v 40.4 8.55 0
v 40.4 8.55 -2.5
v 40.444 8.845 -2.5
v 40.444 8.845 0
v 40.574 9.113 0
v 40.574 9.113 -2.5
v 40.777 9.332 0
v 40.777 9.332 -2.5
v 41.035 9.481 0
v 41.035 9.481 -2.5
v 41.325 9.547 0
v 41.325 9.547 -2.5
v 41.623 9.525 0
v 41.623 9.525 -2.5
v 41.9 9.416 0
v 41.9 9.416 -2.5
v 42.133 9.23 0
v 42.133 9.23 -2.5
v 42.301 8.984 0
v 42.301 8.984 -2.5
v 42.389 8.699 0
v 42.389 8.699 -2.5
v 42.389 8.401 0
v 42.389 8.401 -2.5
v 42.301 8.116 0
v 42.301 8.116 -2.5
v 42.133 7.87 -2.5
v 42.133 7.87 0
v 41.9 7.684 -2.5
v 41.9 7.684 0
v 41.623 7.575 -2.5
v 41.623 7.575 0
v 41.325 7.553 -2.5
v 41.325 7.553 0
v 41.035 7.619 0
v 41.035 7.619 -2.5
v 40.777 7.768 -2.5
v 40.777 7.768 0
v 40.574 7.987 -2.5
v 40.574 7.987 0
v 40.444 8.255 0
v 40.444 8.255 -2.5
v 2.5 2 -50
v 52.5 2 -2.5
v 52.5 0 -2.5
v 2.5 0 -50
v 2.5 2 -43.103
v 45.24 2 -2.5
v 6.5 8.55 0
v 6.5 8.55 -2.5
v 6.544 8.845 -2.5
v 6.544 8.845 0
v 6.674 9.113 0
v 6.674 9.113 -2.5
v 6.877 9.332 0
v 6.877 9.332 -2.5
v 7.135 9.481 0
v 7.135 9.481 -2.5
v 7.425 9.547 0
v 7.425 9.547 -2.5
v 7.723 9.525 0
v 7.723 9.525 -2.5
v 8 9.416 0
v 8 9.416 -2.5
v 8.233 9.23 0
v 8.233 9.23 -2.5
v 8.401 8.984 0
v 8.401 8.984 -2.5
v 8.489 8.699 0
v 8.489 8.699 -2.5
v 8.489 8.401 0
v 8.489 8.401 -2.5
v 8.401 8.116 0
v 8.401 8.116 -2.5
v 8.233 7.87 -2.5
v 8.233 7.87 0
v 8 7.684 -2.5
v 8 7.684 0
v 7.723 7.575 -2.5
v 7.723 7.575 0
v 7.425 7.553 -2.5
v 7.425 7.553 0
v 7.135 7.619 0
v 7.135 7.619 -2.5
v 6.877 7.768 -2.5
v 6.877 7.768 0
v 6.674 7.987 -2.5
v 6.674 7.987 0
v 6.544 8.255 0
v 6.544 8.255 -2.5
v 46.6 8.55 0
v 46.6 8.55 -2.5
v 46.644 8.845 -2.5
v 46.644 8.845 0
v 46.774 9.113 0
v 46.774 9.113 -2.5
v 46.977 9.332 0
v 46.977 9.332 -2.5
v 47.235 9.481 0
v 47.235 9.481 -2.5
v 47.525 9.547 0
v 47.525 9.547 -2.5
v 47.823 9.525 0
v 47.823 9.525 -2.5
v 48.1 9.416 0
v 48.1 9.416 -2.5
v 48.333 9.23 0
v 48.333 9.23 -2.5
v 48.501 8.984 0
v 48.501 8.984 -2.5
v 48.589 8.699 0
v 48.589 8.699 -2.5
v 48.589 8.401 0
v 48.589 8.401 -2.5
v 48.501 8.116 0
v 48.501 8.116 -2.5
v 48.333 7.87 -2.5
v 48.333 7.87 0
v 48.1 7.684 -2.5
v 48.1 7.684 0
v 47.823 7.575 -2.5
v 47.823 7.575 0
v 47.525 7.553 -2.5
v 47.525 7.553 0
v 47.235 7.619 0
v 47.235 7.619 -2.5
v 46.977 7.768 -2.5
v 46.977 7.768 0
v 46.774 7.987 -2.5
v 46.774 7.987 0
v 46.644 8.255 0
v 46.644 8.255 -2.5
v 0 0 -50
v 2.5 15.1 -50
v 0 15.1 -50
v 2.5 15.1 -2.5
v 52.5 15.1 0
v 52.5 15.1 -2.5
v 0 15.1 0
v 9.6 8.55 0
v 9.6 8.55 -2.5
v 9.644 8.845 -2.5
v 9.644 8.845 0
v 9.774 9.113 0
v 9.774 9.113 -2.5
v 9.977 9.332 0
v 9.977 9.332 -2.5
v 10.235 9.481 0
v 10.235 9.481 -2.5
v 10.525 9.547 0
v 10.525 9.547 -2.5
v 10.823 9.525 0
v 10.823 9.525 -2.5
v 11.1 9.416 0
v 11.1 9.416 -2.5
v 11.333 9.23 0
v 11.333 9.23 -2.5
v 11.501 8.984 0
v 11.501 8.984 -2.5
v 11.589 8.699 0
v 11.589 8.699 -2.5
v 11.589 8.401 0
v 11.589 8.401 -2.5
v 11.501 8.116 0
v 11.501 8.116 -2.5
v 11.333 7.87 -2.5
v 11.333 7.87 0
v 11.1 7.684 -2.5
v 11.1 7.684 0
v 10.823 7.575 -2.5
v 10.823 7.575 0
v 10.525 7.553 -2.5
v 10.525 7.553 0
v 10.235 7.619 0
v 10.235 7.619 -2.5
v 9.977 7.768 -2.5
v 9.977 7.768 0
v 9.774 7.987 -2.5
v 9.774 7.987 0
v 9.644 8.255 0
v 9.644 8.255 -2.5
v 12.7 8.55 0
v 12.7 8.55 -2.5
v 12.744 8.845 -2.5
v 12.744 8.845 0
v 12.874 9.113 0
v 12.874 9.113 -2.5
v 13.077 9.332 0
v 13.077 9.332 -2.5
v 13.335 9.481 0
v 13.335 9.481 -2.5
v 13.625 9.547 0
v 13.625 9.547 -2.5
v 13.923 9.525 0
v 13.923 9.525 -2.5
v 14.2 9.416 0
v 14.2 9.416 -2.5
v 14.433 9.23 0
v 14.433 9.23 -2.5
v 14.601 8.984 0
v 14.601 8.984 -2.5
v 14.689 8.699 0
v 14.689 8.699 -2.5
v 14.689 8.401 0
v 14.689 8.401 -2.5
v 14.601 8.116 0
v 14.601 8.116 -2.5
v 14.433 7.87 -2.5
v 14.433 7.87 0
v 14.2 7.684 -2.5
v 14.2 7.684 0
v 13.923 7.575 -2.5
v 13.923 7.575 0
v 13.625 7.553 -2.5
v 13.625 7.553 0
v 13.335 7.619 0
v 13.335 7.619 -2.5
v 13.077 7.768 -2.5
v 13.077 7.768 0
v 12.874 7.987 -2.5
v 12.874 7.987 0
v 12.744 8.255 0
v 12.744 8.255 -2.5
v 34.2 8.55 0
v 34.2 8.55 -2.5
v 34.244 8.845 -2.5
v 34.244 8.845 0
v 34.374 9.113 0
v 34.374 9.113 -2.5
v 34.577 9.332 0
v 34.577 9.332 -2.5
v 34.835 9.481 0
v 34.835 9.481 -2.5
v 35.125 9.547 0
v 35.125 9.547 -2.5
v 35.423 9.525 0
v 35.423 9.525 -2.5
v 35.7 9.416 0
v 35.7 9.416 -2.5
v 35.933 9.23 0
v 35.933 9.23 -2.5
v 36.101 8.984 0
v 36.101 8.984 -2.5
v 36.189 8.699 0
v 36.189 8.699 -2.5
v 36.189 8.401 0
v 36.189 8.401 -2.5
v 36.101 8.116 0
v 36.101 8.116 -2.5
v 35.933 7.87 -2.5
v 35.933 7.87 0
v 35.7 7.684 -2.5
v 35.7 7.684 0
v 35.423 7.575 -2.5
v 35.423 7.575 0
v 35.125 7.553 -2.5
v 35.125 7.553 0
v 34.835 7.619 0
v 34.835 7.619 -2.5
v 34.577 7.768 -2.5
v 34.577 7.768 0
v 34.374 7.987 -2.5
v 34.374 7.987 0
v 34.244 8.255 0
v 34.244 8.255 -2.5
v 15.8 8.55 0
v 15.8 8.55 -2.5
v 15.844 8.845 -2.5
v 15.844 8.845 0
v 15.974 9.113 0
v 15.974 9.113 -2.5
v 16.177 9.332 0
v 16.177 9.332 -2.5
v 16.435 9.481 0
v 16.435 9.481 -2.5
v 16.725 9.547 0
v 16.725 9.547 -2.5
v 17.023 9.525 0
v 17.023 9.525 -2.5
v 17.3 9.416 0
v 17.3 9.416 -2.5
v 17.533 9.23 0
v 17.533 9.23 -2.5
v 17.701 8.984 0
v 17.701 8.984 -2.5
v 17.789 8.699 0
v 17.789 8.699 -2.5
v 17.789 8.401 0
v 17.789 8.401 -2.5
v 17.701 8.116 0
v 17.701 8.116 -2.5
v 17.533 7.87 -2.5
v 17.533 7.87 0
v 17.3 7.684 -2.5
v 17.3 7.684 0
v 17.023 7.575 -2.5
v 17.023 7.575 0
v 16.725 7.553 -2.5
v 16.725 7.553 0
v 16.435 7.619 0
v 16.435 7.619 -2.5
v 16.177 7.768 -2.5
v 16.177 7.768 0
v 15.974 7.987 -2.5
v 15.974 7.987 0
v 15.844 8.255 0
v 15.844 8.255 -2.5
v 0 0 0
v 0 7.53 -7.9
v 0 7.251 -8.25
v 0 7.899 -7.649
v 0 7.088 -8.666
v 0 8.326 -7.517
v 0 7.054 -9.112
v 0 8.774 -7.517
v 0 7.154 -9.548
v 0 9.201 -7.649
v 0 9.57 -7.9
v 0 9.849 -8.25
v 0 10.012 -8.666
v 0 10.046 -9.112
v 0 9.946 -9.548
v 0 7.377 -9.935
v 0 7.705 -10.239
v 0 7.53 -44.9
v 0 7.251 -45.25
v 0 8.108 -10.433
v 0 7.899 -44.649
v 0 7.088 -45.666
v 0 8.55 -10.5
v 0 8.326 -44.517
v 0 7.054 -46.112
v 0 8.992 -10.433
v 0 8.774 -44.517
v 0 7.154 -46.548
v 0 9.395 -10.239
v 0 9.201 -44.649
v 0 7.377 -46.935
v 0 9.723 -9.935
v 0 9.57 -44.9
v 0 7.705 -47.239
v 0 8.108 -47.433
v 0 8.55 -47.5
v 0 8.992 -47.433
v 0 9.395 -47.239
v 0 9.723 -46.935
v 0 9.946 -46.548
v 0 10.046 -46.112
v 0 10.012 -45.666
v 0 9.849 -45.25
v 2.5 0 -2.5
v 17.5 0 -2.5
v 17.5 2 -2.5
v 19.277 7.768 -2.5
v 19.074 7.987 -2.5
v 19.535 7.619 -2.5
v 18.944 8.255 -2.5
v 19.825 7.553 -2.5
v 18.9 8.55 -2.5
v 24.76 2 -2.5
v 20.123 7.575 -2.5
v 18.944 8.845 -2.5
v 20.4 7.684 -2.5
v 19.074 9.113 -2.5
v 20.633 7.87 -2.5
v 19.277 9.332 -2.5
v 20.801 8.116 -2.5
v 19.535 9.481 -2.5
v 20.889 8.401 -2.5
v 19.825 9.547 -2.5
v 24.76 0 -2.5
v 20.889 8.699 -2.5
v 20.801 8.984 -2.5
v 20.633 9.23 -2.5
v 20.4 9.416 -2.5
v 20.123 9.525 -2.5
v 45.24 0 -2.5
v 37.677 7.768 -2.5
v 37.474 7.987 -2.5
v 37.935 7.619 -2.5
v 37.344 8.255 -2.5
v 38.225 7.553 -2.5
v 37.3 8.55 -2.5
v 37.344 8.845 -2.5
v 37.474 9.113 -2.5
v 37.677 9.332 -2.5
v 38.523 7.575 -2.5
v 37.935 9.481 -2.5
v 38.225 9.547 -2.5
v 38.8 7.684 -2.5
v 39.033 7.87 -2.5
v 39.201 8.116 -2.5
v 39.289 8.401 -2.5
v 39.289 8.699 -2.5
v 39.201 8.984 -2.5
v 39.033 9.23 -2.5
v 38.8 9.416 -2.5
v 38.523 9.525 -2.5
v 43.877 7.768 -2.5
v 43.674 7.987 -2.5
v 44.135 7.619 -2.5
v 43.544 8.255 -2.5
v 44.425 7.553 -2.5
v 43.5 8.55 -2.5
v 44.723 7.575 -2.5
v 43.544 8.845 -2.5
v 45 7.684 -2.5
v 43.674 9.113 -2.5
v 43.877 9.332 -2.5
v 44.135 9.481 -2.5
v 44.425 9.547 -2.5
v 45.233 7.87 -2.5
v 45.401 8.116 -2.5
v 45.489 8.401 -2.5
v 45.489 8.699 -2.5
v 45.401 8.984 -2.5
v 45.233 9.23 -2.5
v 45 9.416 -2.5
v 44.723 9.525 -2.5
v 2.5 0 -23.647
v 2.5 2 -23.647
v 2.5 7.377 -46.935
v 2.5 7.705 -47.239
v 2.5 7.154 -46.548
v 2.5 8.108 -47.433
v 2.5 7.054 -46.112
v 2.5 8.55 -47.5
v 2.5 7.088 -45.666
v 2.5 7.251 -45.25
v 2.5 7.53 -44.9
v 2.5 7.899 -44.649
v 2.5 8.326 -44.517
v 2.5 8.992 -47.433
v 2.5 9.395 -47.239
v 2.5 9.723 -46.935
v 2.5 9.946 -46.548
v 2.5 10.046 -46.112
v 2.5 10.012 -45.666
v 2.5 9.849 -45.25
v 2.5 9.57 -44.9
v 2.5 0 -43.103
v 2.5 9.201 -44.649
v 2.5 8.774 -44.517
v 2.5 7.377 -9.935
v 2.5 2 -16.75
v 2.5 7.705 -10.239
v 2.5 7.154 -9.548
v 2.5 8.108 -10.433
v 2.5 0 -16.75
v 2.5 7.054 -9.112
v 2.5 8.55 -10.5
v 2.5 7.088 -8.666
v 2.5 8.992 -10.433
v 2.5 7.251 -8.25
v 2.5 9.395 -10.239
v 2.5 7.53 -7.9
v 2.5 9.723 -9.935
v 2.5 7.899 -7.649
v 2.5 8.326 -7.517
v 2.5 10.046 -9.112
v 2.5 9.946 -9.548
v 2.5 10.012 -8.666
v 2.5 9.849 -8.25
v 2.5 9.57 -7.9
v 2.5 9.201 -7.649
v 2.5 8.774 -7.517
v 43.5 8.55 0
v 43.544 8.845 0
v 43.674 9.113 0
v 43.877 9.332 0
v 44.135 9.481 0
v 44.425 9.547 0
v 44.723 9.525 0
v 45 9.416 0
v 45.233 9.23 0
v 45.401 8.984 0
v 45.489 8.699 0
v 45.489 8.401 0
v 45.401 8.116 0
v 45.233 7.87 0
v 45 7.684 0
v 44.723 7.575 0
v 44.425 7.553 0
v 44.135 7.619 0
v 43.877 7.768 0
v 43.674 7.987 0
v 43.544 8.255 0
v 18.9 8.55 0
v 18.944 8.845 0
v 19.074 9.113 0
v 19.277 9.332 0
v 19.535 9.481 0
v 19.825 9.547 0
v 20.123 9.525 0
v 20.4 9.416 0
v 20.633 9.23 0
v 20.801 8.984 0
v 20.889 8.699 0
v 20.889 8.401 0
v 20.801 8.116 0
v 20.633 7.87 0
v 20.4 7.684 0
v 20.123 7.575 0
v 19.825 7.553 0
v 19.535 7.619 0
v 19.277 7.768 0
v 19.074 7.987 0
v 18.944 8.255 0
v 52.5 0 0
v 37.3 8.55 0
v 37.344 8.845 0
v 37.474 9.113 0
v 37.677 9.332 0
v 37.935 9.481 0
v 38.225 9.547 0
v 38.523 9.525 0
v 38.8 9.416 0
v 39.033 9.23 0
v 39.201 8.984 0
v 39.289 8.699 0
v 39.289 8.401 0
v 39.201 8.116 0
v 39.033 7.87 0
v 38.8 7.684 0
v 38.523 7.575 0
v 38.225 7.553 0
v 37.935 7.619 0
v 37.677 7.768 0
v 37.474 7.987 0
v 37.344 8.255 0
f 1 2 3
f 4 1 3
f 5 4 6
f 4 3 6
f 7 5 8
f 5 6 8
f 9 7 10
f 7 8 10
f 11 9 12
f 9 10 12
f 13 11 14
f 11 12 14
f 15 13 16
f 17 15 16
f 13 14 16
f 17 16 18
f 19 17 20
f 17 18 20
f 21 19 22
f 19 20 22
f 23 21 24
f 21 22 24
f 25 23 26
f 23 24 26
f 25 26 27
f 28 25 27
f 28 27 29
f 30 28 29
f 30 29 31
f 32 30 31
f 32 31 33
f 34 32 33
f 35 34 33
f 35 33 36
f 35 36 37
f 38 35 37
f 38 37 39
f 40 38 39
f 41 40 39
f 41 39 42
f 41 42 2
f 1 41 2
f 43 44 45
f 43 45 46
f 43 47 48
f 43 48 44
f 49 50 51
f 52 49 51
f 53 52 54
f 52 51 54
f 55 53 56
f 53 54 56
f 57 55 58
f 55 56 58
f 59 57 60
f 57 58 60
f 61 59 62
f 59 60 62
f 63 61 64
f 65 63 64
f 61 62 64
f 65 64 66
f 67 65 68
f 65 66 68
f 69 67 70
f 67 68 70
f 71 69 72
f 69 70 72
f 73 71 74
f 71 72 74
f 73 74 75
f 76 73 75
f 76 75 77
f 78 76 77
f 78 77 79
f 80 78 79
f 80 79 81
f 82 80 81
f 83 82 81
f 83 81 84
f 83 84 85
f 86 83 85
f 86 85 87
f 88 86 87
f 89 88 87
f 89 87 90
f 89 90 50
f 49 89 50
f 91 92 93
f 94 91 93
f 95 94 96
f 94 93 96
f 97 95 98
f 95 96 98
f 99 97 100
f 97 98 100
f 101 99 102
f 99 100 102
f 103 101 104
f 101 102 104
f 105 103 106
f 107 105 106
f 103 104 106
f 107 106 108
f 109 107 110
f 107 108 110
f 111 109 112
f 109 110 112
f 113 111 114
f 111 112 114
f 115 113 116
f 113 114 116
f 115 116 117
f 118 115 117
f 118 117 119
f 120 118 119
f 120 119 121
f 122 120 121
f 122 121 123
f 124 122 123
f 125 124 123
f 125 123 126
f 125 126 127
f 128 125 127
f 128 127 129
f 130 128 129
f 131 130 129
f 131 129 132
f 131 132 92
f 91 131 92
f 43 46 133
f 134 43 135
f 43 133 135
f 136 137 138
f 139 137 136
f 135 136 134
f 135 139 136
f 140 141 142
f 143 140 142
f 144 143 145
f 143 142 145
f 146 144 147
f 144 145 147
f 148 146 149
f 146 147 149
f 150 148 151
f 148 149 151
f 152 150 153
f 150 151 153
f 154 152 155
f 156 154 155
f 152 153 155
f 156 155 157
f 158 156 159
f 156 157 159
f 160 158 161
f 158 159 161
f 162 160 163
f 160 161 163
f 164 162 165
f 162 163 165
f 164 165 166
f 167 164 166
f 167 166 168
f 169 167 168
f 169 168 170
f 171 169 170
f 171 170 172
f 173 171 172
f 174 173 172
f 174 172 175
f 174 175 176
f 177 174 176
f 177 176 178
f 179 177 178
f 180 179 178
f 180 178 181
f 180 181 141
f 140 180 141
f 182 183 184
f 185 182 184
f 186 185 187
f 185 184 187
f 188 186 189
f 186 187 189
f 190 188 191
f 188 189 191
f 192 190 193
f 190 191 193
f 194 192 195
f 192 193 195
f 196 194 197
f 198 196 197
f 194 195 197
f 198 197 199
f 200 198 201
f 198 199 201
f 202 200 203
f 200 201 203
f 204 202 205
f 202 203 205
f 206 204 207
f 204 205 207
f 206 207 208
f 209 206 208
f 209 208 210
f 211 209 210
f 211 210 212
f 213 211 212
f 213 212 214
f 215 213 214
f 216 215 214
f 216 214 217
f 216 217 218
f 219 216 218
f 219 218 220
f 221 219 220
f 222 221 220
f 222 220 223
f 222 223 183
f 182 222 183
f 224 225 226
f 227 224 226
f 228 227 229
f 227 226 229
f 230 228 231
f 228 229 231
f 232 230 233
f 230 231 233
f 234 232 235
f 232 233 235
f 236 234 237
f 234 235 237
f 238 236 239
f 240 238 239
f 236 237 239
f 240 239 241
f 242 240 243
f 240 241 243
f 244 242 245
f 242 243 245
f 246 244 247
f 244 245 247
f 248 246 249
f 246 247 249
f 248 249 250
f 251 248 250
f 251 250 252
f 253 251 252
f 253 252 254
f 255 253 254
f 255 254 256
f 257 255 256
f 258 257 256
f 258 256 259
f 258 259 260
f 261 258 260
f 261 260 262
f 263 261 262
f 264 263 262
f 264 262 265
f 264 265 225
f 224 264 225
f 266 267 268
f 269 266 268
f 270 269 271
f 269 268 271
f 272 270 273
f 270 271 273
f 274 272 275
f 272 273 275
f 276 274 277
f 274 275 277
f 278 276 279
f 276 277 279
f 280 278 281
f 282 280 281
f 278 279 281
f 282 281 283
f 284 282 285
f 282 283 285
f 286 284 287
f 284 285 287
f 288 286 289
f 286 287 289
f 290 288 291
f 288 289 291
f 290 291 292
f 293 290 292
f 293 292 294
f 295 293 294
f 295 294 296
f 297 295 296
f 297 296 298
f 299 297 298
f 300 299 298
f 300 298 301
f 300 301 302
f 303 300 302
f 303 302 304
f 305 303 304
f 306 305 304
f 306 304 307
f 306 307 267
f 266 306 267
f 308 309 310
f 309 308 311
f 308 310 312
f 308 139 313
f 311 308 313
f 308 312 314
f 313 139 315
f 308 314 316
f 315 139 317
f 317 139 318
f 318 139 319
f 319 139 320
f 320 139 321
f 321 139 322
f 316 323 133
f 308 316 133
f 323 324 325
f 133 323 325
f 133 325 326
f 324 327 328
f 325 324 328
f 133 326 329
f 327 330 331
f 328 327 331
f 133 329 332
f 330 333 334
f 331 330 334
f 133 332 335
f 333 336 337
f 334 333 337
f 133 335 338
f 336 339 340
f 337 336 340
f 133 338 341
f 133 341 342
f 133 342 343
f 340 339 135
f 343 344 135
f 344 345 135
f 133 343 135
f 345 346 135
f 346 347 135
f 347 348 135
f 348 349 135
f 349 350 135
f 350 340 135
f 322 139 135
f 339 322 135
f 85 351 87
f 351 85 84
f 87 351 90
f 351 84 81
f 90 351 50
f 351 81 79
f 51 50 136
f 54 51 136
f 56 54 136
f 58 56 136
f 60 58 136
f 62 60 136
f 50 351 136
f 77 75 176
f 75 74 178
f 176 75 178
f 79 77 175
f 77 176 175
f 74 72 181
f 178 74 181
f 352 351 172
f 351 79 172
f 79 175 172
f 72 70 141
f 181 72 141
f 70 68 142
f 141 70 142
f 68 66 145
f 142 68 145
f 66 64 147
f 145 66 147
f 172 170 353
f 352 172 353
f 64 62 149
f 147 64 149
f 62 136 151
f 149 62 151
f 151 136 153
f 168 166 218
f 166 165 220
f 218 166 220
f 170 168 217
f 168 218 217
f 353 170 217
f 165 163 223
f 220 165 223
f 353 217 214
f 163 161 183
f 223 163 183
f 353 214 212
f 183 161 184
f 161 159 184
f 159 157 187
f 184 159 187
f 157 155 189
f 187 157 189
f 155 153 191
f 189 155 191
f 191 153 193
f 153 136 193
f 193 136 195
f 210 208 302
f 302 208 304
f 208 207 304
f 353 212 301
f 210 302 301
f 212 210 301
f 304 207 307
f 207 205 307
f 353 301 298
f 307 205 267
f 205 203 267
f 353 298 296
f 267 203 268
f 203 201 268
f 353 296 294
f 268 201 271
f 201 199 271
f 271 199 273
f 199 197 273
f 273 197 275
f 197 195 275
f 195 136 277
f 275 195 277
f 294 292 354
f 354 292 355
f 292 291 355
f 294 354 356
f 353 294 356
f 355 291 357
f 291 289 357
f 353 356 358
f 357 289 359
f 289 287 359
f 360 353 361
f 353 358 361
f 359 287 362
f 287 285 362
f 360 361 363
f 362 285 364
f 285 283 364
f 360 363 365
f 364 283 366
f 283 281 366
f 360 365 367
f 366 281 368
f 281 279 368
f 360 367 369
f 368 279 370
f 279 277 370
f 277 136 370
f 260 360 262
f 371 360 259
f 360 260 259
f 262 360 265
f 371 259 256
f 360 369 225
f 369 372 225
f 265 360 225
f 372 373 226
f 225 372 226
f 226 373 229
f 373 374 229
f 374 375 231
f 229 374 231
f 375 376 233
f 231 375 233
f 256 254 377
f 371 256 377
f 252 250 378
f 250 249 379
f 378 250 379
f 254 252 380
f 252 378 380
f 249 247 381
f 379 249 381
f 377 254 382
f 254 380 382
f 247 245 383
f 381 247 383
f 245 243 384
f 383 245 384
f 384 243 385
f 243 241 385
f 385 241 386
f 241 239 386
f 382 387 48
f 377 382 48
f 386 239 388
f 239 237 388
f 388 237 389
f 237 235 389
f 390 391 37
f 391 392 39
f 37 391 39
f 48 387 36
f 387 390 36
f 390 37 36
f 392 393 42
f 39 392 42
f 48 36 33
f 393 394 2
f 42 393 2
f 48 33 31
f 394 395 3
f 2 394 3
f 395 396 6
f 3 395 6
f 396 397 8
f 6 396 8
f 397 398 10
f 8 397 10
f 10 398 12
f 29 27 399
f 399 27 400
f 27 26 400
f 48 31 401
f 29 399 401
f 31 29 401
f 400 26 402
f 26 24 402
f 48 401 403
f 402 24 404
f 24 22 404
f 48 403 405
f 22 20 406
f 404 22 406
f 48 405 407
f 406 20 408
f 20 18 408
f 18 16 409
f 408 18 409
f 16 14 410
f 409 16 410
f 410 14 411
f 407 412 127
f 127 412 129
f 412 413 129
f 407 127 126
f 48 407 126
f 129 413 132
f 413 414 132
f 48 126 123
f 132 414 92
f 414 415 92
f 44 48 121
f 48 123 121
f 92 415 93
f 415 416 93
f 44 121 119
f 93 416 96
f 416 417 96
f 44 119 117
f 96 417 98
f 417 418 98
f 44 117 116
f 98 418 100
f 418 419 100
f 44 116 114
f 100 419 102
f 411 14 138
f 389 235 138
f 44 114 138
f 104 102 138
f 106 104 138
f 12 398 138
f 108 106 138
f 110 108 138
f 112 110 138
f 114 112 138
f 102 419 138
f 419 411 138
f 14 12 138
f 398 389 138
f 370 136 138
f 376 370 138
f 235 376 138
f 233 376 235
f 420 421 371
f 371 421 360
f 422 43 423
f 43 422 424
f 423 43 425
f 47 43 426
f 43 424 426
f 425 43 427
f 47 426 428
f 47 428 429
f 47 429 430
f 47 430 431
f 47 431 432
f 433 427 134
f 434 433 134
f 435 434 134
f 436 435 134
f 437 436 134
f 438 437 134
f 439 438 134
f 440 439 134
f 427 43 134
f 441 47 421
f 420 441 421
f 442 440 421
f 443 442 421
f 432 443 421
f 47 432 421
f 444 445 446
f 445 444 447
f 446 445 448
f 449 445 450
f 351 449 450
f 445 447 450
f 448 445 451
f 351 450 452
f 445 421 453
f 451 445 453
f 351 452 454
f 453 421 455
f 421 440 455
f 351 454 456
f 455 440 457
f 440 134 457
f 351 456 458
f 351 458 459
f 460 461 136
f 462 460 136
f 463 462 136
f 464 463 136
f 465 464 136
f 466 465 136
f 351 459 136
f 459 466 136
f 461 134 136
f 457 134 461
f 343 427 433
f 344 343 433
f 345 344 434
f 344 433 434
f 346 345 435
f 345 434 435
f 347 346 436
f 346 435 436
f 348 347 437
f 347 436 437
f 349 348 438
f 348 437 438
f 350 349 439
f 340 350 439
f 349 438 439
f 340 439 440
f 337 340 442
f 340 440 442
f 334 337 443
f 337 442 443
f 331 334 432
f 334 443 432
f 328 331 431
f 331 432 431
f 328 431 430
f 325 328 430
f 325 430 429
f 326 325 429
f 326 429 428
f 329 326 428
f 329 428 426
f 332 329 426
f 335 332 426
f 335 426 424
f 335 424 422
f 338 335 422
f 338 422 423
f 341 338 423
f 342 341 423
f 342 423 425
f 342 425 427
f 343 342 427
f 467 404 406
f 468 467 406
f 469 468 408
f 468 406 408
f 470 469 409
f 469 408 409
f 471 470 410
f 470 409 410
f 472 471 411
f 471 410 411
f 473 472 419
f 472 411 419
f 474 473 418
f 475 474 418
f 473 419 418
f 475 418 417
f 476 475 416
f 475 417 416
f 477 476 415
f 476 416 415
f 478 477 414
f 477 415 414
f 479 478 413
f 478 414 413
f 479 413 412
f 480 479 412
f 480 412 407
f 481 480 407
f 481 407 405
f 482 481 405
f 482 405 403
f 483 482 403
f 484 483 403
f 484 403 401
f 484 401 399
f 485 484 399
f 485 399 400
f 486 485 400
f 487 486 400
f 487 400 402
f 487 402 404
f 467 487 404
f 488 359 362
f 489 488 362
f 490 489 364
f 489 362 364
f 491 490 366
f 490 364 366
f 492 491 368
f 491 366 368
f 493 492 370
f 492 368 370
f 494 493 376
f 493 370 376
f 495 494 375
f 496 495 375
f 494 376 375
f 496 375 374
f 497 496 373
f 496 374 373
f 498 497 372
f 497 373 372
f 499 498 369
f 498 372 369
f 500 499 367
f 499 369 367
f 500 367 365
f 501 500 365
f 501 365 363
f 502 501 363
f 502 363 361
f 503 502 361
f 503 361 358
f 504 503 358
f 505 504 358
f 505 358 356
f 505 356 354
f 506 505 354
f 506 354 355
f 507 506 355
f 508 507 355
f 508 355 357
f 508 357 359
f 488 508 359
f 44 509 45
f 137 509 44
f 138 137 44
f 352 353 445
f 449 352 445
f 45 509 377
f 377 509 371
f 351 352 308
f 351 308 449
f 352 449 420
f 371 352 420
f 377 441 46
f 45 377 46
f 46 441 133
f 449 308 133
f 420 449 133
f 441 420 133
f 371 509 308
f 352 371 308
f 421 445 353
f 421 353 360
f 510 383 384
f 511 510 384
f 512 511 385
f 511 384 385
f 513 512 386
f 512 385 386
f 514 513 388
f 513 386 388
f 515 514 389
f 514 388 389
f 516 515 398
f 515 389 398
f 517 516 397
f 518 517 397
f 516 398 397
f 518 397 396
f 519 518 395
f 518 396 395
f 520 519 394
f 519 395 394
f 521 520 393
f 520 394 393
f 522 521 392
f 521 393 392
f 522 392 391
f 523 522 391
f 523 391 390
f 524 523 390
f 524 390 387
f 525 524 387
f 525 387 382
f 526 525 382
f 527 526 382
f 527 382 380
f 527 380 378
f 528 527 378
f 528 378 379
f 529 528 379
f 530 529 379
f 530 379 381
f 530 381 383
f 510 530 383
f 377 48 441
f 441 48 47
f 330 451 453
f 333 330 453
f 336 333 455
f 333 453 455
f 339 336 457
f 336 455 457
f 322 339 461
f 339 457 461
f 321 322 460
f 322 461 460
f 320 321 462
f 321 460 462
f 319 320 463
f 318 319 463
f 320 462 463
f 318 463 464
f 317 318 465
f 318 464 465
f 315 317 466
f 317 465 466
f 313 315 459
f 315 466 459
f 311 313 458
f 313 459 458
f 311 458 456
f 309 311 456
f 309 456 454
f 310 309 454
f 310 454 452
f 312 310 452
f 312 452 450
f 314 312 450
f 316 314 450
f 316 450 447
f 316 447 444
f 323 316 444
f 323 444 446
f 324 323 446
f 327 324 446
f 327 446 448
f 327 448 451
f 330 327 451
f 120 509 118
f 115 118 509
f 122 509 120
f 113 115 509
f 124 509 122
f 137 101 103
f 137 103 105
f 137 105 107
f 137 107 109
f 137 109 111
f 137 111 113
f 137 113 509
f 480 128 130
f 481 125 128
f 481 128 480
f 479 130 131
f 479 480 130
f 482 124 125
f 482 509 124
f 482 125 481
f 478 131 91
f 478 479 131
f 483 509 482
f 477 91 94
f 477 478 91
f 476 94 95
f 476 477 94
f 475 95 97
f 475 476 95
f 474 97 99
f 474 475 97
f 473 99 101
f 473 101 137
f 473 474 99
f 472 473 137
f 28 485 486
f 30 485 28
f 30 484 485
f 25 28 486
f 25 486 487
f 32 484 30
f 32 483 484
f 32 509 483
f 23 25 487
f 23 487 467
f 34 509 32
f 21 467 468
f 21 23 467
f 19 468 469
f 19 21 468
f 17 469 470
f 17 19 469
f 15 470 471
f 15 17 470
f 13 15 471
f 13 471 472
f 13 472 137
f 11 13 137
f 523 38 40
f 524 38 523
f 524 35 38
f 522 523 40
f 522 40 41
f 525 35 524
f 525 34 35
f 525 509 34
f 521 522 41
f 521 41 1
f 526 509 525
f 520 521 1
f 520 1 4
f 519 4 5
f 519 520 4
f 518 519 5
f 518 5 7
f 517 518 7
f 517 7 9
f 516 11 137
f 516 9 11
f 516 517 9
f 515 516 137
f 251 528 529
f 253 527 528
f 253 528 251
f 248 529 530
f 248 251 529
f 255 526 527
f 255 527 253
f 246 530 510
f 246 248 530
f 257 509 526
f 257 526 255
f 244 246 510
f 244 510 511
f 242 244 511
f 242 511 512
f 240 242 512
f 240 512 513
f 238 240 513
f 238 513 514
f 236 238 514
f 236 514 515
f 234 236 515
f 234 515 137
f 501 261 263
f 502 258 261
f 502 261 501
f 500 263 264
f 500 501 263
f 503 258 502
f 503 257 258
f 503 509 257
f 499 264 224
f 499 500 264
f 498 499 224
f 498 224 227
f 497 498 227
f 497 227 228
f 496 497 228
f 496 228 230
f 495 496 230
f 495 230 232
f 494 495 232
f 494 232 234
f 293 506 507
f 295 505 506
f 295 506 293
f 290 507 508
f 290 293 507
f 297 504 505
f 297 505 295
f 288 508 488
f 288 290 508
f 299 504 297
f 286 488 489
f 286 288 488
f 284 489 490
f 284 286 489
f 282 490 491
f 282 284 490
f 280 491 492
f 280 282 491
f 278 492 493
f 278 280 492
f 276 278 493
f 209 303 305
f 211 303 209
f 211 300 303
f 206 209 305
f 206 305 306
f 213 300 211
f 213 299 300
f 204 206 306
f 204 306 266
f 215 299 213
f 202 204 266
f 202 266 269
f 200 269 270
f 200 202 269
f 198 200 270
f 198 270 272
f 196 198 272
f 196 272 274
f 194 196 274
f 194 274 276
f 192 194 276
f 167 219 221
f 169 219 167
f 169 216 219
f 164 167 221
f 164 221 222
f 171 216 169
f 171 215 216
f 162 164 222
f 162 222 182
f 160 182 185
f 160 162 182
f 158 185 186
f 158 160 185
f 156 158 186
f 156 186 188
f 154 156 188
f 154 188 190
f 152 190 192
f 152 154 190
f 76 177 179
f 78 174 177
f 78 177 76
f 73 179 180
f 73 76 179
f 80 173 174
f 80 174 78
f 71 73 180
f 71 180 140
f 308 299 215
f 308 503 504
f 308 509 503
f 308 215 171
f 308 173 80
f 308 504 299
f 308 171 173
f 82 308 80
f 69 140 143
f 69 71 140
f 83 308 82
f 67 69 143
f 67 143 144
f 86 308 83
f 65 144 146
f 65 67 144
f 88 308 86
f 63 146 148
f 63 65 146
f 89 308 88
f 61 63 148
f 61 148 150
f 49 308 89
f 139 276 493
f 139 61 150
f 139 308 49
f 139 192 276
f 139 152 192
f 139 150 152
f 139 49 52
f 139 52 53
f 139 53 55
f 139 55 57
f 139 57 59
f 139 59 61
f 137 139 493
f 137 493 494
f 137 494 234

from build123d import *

# Parameters (mm, degrees)
SKETCH1_W           = 50
SKETCH1_H           = 15.1
BOSS_EXTRUDE1_DEPTH = 2.5
SKETCH3_R           = 1.5
CUT_EXTRUDE1_DEPTH  = 3.5
SKETCH4_W           = 2.5
SKETCH4_H           = 15.1
BOSS_EXTRUDE2_DEPTH = 50
SKETCH6_R           = 1
CUT_EXTRUDE2_DEPTH  = 45
SKETCH8_W           = 47.5
SKETCH8_H           = 2
BOSS_EXTRUDE3_DEPTH = 50
CUT_EXTRUDE3_DEPTH  = 3


with BuildPart() as part:
    # Sketch1 → Boss-Extrude1 (new body)
    with BuildSketch(Plane(origin=(0, 0, 0), x_dir=(0, 0, -1), z_dir=(1, 0, 0))):
        with Locations((25, 7.55)):
            Rectangle(SKETCH1_W, SKETCH1_H)
    extrude(amount=BOSS_EXTRUDE1_DEPTH)

    # Sketch3 → Cut-Extrude1 (cut, through all)
    with BuildSketch(Plane(origin=(2.5, 0, 0), x_dir=(0, 0, -1), z_dir=(1, 0, 0))):
        with Locations((46, 8.55)):
            Circle(SKETCH3_R)
        with Locations((9, 8.55)):
            Circle(SKETCH3_R)
    extrude(amount=-CUT_EXTRUDE1_DEPTH, mode=Mode.SUBTRACT)

    # Sketch4 → Boss-Extrude2 (add)
    with BuildSketch(Plane(origin=(2.5, 0, 0), x_dir=(0, 0, -1), z_dir=(1, 0, 0))):
        with Locations((1.25, 7.55)):
            Rectangle(SKETCH4_W, SKETCH4_H)
    extrude(amount=BOSS_EXTRUDE2_DEPTH)

    # Sketch6 → Cut-Extrude2 (cut)
    with BuildSketch(Plane(origin=(0, 0, -2.5), x_dir=(-1, 0, 0), z_dir=(0, 0, -1))):
        with Locations((-7.5, 8.55)):
            Circle(SKETCH6_R)
        with Locations((-10.6, 8.55)):
            Circle(SKETCH6_R)
        with Locations((-13.7, 8.55)):
            Circle(SKETCH6_R)
        with Locations((-16.8, 8.55)):
            Circle(SKETCH6_R)
        with Locations((-19.9, 8.55)):
            Circle(SKETCH6_R)
        with Locations((-35.2, 8.55)):
            Circle(SKETCH6_R)
        with Locations((-38.3, 8.55)):
            Circle(SKETCH6_R)
        with Locations((-41.4, 8.55)):
            Circle(SKETCH6_R)
        with Locations((-44.5, 8.55)):
            Circle(SKETCH6_R)
        with Locations((-47.6, 8.55)):
            Circle(SKETCH6_R)
    extrude(amount=-CUT_EXTRUDE2_DEPTH, mode=Mode.SUBTRACT)

    # Sketch8 → Boss-Extrude3 (add)
    with BuildSketch(Plane(origin=(2.5, 0, 0), x_dir=(0, 0, -1), z_dir=(1, 0, 0))):
        with Locations((26.25, 1)):
            Rectangle(SKETCH8_W, SKETCH8_H)
    extrude(amount=BOSS_EXTRUDE3_DEPTH)

    # Sketch9 → Cut-Extrude3 (cut, through all)
    with BuildSketch(Plane(origin=(0, 2, 0), x_dir=(1, 0, 0), z_dir=(0, 1, 0))):
        Polygon((45.240466198, 2.5), (2.5, 43.103442888), (2.5, 23.646557112), (24.759533802, 2.5), align=None)
        Polygon((52.5, 2.5), (2.5, 50), (52.5, 50), align=None)
        Polygon((17.5, 2.5), (2.5, 16.75), (2.5, 2.5), align=None)
    extrude(amount=-CUT_EXTRUDE3_DEPTH, mode=Mode.SUBTRACT)


solid = part.part
